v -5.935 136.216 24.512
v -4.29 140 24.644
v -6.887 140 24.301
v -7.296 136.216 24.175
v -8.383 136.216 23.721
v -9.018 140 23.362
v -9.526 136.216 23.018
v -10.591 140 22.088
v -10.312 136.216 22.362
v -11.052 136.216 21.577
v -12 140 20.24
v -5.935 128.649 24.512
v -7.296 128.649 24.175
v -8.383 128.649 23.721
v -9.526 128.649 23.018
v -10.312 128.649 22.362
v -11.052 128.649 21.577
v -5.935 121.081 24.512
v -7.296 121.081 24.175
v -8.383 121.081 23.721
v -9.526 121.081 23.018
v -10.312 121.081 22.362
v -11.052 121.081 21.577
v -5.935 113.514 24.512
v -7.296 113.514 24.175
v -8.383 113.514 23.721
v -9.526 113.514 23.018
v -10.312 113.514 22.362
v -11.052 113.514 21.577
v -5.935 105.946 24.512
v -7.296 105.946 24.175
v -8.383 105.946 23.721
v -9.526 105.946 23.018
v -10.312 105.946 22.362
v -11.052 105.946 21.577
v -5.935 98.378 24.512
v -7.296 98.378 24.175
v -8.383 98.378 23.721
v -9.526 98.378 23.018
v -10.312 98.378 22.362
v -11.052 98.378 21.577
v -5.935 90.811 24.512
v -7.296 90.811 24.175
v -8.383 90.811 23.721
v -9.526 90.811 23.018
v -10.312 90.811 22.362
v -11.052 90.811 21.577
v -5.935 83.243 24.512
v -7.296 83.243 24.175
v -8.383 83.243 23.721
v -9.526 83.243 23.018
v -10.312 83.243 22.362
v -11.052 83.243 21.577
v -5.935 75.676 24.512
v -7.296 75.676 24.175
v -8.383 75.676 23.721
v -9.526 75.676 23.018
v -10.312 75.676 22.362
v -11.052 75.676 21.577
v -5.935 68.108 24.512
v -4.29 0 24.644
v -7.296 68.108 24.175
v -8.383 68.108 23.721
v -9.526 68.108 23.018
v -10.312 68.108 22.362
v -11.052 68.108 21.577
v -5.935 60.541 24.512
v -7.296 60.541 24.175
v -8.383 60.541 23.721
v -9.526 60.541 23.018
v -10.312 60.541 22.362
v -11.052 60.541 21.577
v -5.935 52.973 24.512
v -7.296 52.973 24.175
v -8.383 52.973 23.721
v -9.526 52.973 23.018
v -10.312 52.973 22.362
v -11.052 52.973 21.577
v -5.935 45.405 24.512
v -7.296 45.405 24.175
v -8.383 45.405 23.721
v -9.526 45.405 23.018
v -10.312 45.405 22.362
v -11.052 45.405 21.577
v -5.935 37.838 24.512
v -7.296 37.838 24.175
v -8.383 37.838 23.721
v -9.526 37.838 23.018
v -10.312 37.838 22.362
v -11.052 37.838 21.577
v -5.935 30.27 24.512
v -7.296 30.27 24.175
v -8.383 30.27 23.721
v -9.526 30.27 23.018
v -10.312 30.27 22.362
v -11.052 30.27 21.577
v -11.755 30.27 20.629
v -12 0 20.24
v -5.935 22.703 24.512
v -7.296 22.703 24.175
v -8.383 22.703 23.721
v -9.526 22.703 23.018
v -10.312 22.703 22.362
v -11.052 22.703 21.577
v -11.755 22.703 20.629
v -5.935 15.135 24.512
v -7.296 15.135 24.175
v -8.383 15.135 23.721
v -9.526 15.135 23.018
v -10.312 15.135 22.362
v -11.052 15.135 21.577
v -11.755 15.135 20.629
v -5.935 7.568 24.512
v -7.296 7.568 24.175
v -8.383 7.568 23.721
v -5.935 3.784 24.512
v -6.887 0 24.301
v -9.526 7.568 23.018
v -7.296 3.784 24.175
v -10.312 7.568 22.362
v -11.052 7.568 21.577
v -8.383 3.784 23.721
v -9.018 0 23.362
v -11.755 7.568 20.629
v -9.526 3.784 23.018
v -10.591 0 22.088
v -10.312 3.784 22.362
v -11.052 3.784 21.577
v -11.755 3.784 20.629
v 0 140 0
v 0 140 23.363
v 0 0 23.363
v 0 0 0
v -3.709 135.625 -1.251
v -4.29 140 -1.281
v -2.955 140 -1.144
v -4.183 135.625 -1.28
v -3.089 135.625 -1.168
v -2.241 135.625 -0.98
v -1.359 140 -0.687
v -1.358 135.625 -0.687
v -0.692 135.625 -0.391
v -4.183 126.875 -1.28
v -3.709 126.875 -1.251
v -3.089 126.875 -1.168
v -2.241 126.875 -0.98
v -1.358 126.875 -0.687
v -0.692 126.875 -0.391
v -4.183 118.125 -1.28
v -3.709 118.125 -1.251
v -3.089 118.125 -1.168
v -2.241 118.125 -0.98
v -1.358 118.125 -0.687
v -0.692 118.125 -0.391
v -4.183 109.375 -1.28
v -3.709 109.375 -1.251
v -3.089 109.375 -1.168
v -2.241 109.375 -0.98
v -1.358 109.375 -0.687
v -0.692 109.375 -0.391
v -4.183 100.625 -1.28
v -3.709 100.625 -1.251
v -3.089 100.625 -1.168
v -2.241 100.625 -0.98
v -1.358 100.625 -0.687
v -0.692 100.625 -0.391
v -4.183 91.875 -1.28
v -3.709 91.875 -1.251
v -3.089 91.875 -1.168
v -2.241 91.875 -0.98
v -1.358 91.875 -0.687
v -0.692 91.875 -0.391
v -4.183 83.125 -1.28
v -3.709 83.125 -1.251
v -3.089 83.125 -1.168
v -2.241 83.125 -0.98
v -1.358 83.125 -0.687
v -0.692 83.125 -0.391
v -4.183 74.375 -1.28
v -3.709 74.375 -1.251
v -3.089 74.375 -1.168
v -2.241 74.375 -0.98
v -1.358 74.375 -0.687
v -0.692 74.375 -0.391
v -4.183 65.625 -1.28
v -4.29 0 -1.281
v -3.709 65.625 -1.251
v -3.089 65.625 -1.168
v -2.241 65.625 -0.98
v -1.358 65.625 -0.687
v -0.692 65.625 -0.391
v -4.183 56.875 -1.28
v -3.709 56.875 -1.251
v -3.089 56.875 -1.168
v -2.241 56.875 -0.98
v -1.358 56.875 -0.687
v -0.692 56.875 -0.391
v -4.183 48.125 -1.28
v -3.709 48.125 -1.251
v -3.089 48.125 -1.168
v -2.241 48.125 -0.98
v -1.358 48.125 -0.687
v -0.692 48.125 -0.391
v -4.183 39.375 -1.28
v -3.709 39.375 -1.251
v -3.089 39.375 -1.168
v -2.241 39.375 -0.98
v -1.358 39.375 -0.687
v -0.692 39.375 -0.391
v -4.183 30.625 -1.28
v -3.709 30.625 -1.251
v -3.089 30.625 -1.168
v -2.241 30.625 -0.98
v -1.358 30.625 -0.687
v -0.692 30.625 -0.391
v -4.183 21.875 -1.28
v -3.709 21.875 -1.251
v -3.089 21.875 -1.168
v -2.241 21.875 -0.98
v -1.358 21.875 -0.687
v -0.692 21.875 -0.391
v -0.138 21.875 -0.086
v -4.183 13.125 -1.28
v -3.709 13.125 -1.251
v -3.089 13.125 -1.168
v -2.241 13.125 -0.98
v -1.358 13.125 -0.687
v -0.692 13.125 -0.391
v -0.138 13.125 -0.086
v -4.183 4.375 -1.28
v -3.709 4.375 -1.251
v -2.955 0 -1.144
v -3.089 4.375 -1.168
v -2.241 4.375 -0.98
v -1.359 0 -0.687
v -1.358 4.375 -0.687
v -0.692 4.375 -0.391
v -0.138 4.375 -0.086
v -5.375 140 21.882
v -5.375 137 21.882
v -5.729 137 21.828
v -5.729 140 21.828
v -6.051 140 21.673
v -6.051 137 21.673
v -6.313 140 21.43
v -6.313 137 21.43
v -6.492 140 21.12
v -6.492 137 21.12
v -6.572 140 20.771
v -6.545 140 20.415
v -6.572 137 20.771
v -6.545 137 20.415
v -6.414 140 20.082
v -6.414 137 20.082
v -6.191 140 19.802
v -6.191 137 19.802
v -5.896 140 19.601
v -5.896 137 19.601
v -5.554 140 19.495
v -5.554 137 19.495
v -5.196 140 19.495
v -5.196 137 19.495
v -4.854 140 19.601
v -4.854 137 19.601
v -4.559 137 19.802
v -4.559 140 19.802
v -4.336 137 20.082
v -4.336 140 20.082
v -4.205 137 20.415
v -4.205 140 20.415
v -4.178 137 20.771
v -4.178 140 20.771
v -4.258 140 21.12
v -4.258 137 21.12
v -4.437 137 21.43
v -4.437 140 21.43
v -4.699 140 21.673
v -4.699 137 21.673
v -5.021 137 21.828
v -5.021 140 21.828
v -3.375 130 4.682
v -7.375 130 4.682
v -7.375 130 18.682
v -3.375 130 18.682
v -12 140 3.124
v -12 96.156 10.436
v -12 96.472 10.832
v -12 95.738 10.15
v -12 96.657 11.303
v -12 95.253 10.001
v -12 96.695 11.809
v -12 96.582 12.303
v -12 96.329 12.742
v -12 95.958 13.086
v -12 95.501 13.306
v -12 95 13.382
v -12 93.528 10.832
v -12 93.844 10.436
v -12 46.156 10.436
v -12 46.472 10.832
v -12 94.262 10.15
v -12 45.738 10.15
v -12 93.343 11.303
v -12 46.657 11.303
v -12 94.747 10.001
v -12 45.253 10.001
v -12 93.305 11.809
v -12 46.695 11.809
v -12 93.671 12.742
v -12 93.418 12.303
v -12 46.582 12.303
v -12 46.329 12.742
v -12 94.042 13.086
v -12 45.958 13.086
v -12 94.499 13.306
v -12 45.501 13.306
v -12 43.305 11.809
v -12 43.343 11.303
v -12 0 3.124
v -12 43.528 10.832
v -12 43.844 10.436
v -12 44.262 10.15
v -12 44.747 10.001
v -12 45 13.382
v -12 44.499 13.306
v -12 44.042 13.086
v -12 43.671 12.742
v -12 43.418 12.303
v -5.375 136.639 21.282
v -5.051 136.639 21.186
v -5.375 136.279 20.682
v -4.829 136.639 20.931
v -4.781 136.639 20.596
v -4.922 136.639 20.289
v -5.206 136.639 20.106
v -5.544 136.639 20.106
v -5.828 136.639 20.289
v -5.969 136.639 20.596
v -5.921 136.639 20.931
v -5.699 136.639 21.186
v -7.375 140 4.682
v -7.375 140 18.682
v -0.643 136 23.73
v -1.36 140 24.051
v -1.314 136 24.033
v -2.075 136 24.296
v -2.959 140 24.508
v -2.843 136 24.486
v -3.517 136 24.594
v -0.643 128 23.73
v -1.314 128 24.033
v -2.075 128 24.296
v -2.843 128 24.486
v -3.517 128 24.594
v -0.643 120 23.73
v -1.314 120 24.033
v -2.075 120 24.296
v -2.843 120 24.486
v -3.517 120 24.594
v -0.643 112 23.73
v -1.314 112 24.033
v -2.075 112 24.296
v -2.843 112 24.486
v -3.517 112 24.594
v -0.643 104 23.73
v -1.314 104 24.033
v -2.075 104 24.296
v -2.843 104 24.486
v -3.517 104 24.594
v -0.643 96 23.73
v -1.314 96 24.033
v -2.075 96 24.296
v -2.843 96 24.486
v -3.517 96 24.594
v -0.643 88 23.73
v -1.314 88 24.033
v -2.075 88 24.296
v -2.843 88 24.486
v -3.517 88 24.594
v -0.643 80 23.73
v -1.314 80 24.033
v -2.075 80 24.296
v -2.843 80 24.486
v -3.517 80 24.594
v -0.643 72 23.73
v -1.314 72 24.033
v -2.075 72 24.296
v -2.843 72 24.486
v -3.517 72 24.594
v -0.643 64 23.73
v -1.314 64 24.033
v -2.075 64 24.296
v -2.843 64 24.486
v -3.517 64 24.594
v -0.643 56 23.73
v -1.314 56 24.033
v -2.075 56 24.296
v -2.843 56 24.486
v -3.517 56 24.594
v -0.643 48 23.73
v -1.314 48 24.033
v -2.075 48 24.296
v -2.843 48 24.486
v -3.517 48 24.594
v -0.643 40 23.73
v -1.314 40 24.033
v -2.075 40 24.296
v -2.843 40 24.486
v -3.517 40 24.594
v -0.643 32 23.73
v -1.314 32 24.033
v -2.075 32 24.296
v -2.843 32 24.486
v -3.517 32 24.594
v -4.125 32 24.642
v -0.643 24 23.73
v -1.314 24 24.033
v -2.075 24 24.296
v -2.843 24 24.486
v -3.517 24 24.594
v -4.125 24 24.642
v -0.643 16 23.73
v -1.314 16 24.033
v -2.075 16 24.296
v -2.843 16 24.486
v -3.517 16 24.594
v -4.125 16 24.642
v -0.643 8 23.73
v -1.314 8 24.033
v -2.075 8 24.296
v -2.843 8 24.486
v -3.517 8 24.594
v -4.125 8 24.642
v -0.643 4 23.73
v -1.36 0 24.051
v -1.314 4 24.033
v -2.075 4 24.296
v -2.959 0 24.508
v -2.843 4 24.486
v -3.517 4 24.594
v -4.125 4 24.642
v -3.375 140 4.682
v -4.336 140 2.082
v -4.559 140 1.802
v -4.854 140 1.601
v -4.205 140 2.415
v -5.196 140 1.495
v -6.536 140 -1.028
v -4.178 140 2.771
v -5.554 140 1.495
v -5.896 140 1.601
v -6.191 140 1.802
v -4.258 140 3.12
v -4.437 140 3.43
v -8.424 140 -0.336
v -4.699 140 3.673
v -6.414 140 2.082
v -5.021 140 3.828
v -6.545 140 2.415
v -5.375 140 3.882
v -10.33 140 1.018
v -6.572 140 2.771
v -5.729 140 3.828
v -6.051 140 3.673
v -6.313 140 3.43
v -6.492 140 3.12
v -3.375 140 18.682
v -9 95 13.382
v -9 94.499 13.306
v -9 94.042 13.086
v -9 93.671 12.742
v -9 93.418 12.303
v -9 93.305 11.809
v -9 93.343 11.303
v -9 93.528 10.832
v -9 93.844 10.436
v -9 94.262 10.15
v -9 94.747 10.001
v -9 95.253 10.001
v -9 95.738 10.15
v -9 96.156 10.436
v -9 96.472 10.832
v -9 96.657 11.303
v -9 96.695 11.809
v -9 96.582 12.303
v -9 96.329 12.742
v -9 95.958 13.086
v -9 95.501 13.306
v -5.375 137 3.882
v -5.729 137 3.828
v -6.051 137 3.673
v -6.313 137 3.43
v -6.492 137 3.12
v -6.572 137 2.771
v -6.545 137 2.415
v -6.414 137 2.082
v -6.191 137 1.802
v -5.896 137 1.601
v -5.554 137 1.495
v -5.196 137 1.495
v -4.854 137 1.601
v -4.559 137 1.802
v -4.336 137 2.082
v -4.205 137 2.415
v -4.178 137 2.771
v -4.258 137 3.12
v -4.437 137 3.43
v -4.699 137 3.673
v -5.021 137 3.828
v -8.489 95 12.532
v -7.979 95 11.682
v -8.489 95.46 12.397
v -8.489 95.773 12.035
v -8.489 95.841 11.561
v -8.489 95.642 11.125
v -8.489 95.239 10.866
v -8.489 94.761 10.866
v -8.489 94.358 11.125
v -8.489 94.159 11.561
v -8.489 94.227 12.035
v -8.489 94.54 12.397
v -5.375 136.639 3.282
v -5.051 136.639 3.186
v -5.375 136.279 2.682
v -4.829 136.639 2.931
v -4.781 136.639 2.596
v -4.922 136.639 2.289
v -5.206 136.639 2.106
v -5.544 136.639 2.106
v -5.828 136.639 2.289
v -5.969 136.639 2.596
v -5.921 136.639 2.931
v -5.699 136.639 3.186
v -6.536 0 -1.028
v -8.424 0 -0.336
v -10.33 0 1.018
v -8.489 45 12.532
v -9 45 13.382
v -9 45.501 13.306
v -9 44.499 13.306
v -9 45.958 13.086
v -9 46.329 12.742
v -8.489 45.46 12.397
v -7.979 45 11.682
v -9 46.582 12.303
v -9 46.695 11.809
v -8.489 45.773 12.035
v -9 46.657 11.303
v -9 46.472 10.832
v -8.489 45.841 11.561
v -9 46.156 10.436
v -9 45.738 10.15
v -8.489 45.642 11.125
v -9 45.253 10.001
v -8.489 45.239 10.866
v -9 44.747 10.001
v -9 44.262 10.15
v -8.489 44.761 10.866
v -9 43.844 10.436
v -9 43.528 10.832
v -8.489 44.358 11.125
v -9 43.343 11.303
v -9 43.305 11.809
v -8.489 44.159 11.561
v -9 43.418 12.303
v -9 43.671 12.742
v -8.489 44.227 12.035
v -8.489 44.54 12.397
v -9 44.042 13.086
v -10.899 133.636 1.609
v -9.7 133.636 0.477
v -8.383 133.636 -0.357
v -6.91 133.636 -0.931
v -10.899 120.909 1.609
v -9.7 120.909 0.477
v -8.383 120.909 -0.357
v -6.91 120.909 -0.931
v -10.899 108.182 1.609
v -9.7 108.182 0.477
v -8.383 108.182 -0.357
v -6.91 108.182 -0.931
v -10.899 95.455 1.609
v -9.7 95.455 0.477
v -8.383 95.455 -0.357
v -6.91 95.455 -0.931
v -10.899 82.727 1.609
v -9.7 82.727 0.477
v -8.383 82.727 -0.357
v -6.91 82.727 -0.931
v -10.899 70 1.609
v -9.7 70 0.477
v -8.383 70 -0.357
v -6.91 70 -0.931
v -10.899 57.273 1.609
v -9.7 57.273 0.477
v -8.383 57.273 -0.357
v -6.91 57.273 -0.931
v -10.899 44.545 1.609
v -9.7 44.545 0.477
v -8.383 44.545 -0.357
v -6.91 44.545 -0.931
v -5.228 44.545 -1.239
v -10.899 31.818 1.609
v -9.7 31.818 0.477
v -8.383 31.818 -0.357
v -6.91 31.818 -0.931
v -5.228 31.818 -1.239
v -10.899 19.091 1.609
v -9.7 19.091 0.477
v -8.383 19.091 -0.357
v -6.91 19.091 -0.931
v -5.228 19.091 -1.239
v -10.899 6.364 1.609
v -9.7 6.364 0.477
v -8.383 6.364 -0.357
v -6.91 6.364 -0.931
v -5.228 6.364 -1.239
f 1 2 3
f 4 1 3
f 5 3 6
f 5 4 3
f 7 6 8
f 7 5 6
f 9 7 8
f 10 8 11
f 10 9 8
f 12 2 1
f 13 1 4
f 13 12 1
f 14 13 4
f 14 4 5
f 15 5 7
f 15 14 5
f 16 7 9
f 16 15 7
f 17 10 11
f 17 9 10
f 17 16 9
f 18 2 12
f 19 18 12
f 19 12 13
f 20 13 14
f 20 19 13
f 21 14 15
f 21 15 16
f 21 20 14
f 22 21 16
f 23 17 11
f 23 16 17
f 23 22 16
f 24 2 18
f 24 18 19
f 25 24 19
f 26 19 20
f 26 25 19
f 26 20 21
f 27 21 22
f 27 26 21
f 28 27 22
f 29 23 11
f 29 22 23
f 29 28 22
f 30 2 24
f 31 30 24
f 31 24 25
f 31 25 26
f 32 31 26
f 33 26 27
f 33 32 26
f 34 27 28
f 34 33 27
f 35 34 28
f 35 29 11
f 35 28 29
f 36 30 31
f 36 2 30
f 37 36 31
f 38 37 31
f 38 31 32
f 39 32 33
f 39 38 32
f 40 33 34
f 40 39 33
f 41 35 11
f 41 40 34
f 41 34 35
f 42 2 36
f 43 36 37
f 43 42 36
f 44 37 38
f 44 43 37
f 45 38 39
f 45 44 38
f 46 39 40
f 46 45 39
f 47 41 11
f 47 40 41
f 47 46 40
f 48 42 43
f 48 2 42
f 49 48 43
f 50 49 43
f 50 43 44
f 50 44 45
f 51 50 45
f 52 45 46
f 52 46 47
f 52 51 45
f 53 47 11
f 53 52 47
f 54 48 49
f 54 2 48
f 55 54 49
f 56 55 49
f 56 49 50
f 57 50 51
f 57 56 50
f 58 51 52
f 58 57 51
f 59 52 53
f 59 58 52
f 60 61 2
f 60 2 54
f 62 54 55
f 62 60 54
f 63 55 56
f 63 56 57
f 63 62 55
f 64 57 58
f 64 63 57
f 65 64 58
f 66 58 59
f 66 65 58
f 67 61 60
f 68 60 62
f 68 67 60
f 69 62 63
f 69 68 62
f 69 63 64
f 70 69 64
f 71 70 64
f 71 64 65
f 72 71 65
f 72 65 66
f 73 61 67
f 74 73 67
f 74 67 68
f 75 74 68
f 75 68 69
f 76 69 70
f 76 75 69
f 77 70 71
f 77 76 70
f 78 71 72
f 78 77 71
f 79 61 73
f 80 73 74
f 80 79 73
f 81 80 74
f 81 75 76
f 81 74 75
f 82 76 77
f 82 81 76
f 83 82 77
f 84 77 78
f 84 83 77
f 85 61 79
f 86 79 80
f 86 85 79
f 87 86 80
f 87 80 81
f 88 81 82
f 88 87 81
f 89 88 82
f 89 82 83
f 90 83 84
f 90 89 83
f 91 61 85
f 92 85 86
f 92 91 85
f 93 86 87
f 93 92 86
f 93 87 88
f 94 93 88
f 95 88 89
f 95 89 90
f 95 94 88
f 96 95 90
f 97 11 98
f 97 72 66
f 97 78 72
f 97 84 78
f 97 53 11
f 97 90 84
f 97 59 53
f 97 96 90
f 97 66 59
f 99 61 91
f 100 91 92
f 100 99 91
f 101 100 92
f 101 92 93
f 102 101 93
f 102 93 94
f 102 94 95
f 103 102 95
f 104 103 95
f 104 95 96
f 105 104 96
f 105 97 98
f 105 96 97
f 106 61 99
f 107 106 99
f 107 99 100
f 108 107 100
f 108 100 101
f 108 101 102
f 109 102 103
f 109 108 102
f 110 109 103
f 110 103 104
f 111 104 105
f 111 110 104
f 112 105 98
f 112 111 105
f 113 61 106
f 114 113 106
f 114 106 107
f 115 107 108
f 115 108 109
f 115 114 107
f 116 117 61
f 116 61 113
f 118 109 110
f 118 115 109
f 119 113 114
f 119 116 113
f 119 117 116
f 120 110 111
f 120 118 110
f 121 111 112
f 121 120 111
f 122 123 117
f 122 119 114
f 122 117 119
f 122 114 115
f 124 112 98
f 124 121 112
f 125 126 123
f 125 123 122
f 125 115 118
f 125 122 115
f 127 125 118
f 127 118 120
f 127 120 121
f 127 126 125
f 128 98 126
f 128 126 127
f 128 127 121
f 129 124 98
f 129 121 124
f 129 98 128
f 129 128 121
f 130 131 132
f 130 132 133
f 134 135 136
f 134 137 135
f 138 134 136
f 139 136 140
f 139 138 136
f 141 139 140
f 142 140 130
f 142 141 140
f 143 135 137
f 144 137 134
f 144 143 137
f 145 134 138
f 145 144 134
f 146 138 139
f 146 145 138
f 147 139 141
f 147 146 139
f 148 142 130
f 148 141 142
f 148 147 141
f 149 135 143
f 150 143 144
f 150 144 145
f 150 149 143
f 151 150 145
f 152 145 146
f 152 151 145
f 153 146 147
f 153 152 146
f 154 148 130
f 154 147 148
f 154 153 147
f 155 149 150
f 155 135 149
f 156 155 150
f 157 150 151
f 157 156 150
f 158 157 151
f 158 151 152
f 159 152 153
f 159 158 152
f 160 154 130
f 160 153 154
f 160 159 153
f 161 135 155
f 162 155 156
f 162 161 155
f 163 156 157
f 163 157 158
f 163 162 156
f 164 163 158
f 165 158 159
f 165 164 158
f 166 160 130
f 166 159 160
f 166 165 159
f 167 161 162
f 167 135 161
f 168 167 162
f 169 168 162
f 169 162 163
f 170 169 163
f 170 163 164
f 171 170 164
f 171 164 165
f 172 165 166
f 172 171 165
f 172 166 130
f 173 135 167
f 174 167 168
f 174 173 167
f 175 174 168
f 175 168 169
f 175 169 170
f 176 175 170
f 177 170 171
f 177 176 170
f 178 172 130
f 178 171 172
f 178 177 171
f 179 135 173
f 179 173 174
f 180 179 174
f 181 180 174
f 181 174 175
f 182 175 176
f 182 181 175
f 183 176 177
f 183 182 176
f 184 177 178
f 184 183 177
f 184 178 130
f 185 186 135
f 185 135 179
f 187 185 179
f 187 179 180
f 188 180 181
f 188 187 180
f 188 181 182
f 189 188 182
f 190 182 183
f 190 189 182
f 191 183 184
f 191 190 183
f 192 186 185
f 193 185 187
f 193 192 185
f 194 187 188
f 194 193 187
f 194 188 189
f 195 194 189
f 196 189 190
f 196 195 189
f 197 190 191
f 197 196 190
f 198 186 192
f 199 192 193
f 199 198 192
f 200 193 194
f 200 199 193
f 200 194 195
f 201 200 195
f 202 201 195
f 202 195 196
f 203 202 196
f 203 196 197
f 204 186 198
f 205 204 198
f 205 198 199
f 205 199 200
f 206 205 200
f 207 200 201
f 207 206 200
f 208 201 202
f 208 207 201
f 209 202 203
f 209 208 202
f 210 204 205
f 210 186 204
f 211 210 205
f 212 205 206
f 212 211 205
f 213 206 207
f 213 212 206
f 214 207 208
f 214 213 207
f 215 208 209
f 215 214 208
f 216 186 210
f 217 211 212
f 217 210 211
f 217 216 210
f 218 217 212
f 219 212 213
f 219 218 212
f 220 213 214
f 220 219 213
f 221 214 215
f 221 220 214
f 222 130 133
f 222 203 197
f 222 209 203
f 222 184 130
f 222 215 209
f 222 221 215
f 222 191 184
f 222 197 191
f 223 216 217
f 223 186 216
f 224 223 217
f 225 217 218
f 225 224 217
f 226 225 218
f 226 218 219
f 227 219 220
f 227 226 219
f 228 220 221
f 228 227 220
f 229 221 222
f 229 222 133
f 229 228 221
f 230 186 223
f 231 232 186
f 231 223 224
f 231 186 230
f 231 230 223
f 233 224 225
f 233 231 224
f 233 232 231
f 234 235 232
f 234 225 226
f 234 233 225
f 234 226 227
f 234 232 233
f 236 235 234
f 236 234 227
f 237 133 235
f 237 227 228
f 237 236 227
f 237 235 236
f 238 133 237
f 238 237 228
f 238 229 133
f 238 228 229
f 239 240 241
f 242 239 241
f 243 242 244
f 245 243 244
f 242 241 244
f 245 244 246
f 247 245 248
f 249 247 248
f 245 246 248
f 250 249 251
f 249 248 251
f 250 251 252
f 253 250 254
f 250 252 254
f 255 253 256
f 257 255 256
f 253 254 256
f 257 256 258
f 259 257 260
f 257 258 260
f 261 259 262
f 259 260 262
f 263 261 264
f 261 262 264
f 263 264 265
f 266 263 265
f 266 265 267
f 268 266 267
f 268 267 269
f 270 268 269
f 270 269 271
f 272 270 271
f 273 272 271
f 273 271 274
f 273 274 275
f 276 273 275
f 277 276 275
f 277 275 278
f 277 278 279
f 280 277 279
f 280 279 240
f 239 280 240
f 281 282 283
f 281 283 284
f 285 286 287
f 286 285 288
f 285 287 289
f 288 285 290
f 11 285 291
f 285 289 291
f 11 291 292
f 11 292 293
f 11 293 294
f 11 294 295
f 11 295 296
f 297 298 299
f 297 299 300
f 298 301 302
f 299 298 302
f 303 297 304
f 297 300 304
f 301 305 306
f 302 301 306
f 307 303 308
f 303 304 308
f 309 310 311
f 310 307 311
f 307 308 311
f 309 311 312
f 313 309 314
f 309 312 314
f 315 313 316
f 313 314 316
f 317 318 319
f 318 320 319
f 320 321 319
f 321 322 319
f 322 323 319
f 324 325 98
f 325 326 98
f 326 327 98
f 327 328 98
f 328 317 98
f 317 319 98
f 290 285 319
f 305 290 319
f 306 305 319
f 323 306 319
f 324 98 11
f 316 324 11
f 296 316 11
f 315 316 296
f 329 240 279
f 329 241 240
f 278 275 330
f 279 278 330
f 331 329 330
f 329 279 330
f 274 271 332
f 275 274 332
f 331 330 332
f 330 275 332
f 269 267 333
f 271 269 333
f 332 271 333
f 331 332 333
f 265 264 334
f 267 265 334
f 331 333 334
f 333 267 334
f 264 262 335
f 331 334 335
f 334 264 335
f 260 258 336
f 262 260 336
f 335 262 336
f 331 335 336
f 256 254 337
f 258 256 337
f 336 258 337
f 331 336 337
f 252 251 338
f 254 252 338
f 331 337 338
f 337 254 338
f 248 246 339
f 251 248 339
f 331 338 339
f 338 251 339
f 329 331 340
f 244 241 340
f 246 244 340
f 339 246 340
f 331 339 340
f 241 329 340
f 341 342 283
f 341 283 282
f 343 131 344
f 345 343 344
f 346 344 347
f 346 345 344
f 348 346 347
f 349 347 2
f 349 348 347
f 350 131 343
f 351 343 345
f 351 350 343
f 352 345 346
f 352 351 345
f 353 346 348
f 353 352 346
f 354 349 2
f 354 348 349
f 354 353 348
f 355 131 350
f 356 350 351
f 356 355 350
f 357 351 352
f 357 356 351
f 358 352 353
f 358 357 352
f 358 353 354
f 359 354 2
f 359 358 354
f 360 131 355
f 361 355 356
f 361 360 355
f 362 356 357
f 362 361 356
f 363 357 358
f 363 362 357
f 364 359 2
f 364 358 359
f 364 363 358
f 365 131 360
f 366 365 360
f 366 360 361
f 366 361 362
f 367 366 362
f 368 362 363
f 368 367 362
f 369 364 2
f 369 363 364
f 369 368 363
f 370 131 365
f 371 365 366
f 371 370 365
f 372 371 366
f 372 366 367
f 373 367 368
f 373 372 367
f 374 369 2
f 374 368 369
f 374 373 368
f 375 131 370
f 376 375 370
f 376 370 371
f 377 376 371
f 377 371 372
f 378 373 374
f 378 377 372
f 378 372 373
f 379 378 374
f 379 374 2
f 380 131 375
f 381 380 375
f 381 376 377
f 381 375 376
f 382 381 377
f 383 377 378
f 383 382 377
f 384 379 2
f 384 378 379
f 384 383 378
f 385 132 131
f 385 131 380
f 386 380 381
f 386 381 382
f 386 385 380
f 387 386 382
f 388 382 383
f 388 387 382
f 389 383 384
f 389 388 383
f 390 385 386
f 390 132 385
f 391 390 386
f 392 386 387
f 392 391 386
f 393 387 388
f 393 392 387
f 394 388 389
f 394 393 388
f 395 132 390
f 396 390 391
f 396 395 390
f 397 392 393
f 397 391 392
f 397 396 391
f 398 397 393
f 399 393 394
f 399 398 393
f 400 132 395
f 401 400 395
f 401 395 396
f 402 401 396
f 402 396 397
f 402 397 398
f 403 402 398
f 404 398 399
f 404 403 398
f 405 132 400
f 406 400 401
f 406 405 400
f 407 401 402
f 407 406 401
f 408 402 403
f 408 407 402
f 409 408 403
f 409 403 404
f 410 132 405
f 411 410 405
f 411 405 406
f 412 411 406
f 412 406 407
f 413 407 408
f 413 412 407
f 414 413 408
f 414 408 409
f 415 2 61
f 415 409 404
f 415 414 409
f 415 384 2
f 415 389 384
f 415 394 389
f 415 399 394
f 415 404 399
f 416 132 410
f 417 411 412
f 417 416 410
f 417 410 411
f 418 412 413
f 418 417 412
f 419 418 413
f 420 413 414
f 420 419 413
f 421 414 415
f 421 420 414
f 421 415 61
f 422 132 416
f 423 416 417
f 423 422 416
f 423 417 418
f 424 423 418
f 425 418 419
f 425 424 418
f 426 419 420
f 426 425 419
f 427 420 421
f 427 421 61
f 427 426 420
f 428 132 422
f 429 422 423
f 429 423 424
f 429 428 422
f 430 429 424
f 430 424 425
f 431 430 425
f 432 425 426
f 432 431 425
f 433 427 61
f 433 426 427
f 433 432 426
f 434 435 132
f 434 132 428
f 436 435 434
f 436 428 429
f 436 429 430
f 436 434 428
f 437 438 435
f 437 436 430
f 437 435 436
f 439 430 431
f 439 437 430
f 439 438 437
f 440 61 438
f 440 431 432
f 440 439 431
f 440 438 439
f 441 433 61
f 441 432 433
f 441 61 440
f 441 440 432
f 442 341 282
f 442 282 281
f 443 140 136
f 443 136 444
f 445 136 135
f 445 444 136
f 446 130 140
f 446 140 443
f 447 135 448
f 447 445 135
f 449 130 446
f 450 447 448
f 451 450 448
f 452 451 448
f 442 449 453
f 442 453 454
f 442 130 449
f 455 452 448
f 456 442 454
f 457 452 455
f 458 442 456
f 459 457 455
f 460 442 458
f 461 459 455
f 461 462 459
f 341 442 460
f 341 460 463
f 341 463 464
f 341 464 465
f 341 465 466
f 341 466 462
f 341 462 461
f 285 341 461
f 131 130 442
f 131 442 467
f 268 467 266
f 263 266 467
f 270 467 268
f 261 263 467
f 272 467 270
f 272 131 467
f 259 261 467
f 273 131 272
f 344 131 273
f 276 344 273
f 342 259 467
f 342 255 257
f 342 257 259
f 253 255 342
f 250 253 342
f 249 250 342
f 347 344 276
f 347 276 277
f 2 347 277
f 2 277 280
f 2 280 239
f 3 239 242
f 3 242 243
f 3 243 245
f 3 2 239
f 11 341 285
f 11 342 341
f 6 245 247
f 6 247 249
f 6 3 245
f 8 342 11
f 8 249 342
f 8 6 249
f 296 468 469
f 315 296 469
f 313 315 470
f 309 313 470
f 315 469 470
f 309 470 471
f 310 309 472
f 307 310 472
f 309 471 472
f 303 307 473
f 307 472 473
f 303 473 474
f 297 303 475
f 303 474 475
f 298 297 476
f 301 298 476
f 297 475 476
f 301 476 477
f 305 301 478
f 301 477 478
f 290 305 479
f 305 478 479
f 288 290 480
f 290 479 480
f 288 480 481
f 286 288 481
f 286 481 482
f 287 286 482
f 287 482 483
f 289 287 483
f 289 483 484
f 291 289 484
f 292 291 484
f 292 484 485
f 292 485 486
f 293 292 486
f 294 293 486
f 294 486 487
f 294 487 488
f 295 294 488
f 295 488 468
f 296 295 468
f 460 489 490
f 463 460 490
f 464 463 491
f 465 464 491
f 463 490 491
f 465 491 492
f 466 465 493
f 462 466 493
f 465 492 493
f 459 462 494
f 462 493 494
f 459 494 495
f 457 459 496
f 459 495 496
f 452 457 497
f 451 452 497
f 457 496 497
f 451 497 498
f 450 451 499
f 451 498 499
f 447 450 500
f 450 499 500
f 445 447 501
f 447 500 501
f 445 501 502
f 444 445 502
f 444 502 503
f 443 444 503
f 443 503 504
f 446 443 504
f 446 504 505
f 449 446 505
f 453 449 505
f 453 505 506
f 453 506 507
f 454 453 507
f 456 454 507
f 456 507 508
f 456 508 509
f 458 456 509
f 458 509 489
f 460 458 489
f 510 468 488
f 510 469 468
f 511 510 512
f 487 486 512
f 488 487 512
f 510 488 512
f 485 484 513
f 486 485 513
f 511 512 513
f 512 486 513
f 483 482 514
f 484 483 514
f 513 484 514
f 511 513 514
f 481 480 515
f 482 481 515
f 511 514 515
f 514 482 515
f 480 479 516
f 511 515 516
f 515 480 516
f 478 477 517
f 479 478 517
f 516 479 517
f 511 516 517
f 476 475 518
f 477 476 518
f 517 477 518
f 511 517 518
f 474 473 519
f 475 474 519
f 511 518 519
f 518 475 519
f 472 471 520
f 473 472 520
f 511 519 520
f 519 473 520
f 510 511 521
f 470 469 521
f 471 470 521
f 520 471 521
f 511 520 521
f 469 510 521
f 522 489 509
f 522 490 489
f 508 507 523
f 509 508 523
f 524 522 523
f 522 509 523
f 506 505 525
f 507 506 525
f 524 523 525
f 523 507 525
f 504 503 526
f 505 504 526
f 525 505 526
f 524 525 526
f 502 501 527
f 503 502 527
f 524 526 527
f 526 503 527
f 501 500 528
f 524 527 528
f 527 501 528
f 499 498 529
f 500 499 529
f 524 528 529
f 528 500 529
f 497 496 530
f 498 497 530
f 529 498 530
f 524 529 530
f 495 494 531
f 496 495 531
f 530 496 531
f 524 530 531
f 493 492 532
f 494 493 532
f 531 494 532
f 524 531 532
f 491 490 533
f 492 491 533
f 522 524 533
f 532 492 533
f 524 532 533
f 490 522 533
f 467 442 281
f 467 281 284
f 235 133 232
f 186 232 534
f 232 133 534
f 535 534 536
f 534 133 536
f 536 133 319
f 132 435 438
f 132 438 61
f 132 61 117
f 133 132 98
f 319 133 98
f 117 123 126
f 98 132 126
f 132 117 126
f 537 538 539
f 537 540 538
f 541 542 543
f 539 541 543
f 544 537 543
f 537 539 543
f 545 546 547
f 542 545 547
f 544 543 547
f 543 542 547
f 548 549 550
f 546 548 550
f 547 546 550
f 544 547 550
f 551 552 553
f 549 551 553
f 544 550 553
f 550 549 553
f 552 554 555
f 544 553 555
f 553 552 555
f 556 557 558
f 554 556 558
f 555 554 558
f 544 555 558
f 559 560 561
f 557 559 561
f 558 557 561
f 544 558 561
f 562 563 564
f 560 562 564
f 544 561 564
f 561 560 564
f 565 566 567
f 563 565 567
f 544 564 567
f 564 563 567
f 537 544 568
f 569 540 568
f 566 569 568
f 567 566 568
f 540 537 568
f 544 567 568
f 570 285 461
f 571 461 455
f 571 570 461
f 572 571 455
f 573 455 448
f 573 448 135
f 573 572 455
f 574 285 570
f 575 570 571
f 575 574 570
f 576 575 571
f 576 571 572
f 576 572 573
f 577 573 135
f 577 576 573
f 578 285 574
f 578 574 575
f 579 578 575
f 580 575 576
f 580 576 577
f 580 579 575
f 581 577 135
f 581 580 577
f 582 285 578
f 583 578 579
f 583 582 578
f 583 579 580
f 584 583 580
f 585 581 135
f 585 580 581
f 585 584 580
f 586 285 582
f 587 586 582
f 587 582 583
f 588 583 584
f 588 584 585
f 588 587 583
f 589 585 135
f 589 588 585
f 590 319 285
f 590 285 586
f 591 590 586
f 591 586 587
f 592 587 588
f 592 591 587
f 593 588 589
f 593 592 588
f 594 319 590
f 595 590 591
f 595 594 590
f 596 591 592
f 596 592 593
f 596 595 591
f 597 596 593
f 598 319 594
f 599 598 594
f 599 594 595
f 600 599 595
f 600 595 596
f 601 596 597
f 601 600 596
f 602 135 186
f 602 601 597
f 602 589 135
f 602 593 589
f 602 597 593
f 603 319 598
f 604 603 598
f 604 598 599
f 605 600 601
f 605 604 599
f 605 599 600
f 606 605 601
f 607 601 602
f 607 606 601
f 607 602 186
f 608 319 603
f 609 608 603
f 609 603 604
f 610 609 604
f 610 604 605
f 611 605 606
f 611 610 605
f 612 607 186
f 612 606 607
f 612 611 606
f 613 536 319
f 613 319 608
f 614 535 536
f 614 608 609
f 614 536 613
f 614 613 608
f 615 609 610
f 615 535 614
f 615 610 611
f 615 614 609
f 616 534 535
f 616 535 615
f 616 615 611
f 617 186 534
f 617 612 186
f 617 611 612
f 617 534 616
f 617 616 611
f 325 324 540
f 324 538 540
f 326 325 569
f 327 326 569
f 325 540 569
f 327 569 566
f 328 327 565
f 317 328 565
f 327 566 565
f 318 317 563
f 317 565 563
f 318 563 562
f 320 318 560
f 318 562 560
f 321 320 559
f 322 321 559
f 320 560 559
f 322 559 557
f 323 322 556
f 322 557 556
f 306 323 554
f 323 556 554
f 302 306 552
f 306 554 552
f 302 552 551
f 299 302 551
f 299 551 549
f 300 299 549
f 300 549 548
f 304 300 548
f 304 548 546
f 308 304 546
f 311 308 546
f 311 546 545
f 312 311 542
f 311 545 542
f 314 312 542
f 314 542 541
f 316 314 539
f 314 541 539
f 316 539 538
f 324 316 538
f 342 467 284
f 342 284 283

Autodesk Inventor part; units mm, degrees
ref_plane "YZ Plane" through (0, 0, 0) normal (1, 0, 0) x (0, 1, 0)
ref_plane "XZ Plane" through (0, 0, 0) normal (0, 1, 0) x (-1, 0, 0)
ref_plane "XY Plane" through (0, 0, 0) normal (0, 0, 1) x (1, 0, 0)
sketch "Szkic1" plane through (0, 0, 0) normal (0, 1, 0) x (-1, 0, 0)
  spline S0 degree 3 poles (4.29, 24.6442) (4.4521, 24.6442) (4.6114, 24.6406) (4.7677, 24.6336) (4.8034, 24.632) (4.8389, 24.6302) (4.8743, 24.6283) (4.9939, 24.6216) (5.1117, 24.613) (5.2279, 24.6025) (5.2909, 24.5968) (5.3533, 24.5906) (5.4152, 24.5838) (5.5016, 24.5743) (5.5869, 24.5637) (5.6714, 24.5521) (5.7603, 24.5399) (5.8483, 24.5266) (5.9352, 24.5122) (5.9902, 24.503) (6.0448, 24.4934) (6.099, 24.4834) (6.213, 24.4624) (6.3254, 24.4394) (6.4363, 24.4145) (6.4615, 24.4088) (6.4866, 24.4031) (6.5116, 24.3972) (6.6467, 24.3657) (6.7795, 24.3313) (6.9102, 24.2942) (7.0408, 24.2571) (7.1693, 24.2173) (7.2957, 24.1748) (7.3261, 24.1646) (7.3564, 24.1542) (7.3866, 24.1437) (7.4819, 24.1104) (7.576, 24.0756) (7.6691, 24.0393) (7.7261, 24.0171) (7.7827, 23.9943) (7.8389, 23.9709) (7.9035, 23.944) (7.9676, 23.9164) (8.0312, 23.888) (8.1143, 23.8509) (8.1964, 23.8125) (8.2778, 23.7729) (8.313, 23.7557) (8.348, 23.7383) (8.3829, 23.7207) (8.4915, 23.6658) (8.5987, 23.6086) (8.7045, 23.5489) (8.7113, 23.5451) (8.7181, 23.5412) (8.7249, 23.5374) (8.8374, 23.4736) (8.9484, 23.407) (9.058, 23.3376) (9.0788, 23.3245) (9.0995, 23.3112) (9.1202, 23.2979) (9.2086, 23.2408) (9.2961, 23.1819) (9.3827, 23.121) (9.4307, 23.0873) (9.4784, 23.0531) (9.5258, 23.0182) (9.5842, 22.9753) (9.6421, 22.9315) (9.6997, 22.8868) (9.7745, 22.8287) (9.8486, 22.7691) (9.9222, 22.7079) (9.9514, 22.6836) (9.9805, 22.659) (10.0095, 22.6342) (10.1116, 22.5468) (10.2126, 22.4562) (10.3125, 22.3621) (10.4124, 22.2681) (10.5112, 22.1706) (10.609, 22.0695) (10.6346, 22.043) (10.6601, 22.0163) (10.6855, 21.9894) (10.7573, 21.9132) (10.8286, 21.8351) (10.8993, 21.7548) (10.9505, 21.6966) (11.0014, 21.6374) (11.052, 21.577) (11.0961, 21.5244) (11.1399, 21.4708) (11.1836, 21.4164) (11.2594, 21.3219) (11.3345, 21.2247) (11.409, 21.1244) (11.4266, 21.1006) (11.4443, 21.0767) (11.4619, 21.0525) (11.5537, 20.9267) (11.6444, 20.7964) (11.7342, 20.661) (11.7412, 20.6503) (11.7483, 20.6396) (11.7554, 20.6289) (11.8379, 20.5035) (11.9195, 20.3738) (12, 20.2398) knots 0 0 0 0 0.045455 0.045455 0.045455 0.05583 0.05583 0.05583 0.090909 0.090909 0.090909 0.109901 0.109901 0.109901 0.136364 0.136364 0.136364 0.164215 0.164215 0.164215 0.181818 0.181818 0.181818 0.218856 0.218856 0.218856 0.227273 0.227273 0.227273 0.272727 0.272727 0.272727 0.318182 0.318182 0.318182 0.329116 0.329116 0.329116 0.363636 0.363636 0.363636 0.384782 0.384782 0.384782 0.409091 0.409091 0.409091 0.440823 0.440823 0.440823 0.454545 0.454545 0.454545 0.497251 0.497251 0.497251 0.5 0.5 0.5 0.545455 0.545455 0.545455 0.554072 0.554072 0.554072 0.590909 0.590909 0.590909 0.611291 0.611291 0.611291 0.636364 0.636364 0.636364 0.668896 0.668896 0.668896 0.681818 0.681818 0.681818 0.727273 0.727273 0.727273 0.772727 0.772727 0.772727 0.784612 0.784612 0.784612 0.818182 0.818182 0.818182 0.842477 0.842477 0.842477 0.863636 0.863636 0.863636 0.900365 0.900365 0.900365 0.909091 0.909091 0.909091 0.954545 0.954545 0.954545 0.958127 0.958127 0.958127 1 1 1 1
  spline S1 degree 3 poles (0, 23.3634) (0.0313, 23.3834) (0.0629, 23.4032) (0.0948, 23.4229) (0.1661, 23.4669) (0.2387, 23.51) (0.3127, 23.5522) (0.3366, 23.5659) (0.3606, 23.5794) (0.3848, 23.5929) (0.4689, 23.6397) (0.5548, 23.6854) (0.6428, 23.7301) (0.6619, 23.7398) (0.6811, 23.7494) (0.7004, 23.759) (0.7955, 23.8063) (0.893, 23.8524) (0.9925, 23.8971) (1.0001, 23.9005) (1.0078, 23.9039) (1.0155, 23.9073) (1.1133, 23.9508) (1.213, 23.9929) (1.3144, 24.0334) (1.3295, 24.0394) (1.3447, 24.0454) (1.3599, 24.0514) (1.4359, 24.0812) (1.5128, 24.1101) (1.5905, 24.138) (1.6407, 24.156) (1.6913, 24.1737) (1.7423, 24.1909) (1.7757, 24.2022) (1.8093, 24.2133) (1.843, 24.2243) (1.9195, 24.2491) (1.9968, 24.2731) (2.0748, 24.2961) (2.096, 24.3023) (2.1174, 24.3085) (2.1387, 24.3146) (2.1887, 24.3289) (2.2389, 24.3428) (2.2893, 24.3563) (2.3554, 24.374) (2.4218, 24.391) (2.4885, 24.4072) (2.5077, 24.4119) (2.527, 24.4165) (2.5463, 24.4211) (2.5883, 24.431) (2.6305, 24.4407) (2.6727, 24.45) (2.7293, 24.4625) (2.786, 24.4745) (2.8426, 24.4858) (2.8813, 24.4936) (2.9201, 24.5011) (2.9588, 24.5084) (2.9723, 24.5109) (2.9859, 24.5134) (2.9995, 24.5159) (3.0482, 24.5248) (3.0967, 24.5332) (3.1446, 24.5411) (3.1899, 24.5486) (3.2347, 24.5556) (3.2786, 24.5621) (3.3055, 24.5661) (3.332, 24.57) (3.3581, 24.5736) (3.373, 24.5757) (3.3878, 24.5777) (3.4024, 24.5797) (3.4415, 24.5849) (3.4798, 24.5898) (3.5172, 24.5942) (3.5534, 24.5986) (3.5889, 24.6026) (3.6237, 24.6062) (3.6534, 24.6094) (3.6826, 24.6123) (3.7112, 24.615) (3.7155, 24.6154) (3.7198, 24.6158) (3.724, 24.6162) (3.7577, 24.6193) (3.7907, 24.6221) (3.823, 24.6246) (3.8575, 24.6273) (3.8912, 24.6297) (3.9242, 24.6318) (3.9568, 24.6339) (3.9888, 24.6357) (4.0201, 24.6372) (4.0561, 24.639) (4.0912, 24.6404) (4.1254, 24.6415) (4.1561, 24.6425) (4.186, 24.6432) (4.2153, 24.6436) (4.2407, 24.644) (4.2656, 24.6442) (4.29, 24.6442) knots 0 0 0 0 0.025747 0.025747 0.025747 0.083333 0.083333 0.083333 0.101932 0.101932 0.101932 0.166667 0.166667 0.166667 0.180728 0.180728 0.180728 0.25 0.25 0.25 0.255325 0.255325 0.255325 0.323187 0.323187 0.323187 0.333333 0.333333 0.333333 0.383956 0.383956 0.383956 0.416667 0.416667 0.416667 0.438102 0.438102 0.438102 0.486742 0.486742 0.486742 0.5 0.5 0.5 0.531015 0.531015 0.531015 0.571623 0.571623 0.571623 0.583333 0.583333 0.583333 0.608888 0.608888 0.608888 0.643164 0.643164 0.643164 0.666667 0.666667 0.666667 0.674925 0.674925 0.674925 0.704638 0.704638 0.704638 0.732781 0.732781 0.732781 0.75 0.75 0.75 0.759817 0.759817 0.759817 0.786075 0.786075 0.786075 0.811555 0.811555 0.811555 0.833333 0.833333 0.833333 0.836565 0.836565 0.836565 0.86226 0.86226 0.86226 0.889614 0.889614 0.889614 0.916667 0.916667 0.916667 0.947785 0.947785 0.947785 0.975695 0.975695 0.975695 1 1 1 1
  line L0 (0, 23.3634) -> (0, 0)
  spline S2 degree 3 poles (4.29, -1.2808) (4.2555, -1.2808) (4.2199, -1.2804) (4.1832, -1.2796) (4.15, -1.2789) (4.1159, -1.2779) (4.081, -1.2765) (4.0607, -1.2757) (4.0401, -1.2748) (4.0192, -1.2737) (4.0064, -1.2731) (3.9935, -1.2724) (3.9804, -1.2717) (3.948, -1.2699) (3.9149, -1.2678) (3.881, -1.2655) (3.8471, -1.2631) (3.8125, -1.2604) (3.7771, -1.2574) (3.7548, -1.2555) (3.7322, -1.2535) (3.7093, -1.2513) (3.6944, -1.2499) (3.6793, -1.2485) (3.664, -1.2469) (3.6238, -1.2429) (3.5825, -1.2385) (3.5402, -1.2335) (3.496, -1.2284) (3.4506, -1.2227) (3.4039, -1.2164) (3.3878, -1.2143) (3.3716, -1.2121) (3.3552, -1.2098) (3.322, -1.2051) (3.2881, -1.2002) (3.2538, -1.1949) (3.1998, -1.1867) (3.1445, -1.1778) (3.0886, -1.1682) (3.0444, -1.1606) (2.9999, -1.1526) (2.9552, -1.1443) (2.9389, -1.1412) (2.9225, -1.1381) (2.9062, -1.1349) (2.8392, -1.122) (2.7721, -1.1082) (2.7051, -1.0937) (2.6511, -1.0819) (2.5971, -1.0696) (2.5432, -1.0569) (2.5237, -1.0523) (2.5042, -1.0476) (2.4847, -1.0428) (2.4029, -1.0229) (2.3215, -1.0019) (2.2408, -0.9798) (2.2058, -0.9702) (2.1709, -0.9604) (2.1362, -0.9505) (2.0792, -0.9341) (2.0226, -0.9173) (1.9664, -0.8999) (1.8903, -0.8764) (1.8149, -0.8521) (1.7404, -0.8268) (1.7134, -0.8177) (1.6866, -0.8084) (1.6598, -0.7991) (1.5579, -0.7635) (1.4574, -0.7262) (1.3585, -0.6874) (1.3491, -0.6837) (1.3397, -0.68) (1.3303, -0.6762) (1.2151, -0.6306) (1.102, -0.5828) (0.9914, -0.5331) (0.8892, -0.4873) (0.7891, -0.4398) (0.6916, -0.3912) (0.675, -0.3829) (0.6585, -0.3746) (0.642, -0.3662) (0.5634, -0.3263) (0.4865, -0.2856) (0.4111, -0.244) (0.3779, -0.2257) (0.3451, -0.2073) (0.3125, -0.1887) (0.2537, -0.1551) (0.1957, -0.1209) (0.1385, -0.0862) (0.0918, -0.0578) (0.0456, -0.0291) (0, 0) knots 0 0 0 0 0.034308 0.034308 0.034308 0.065329 0.065329 0.065329 0.083333 0.083333 0.083333 0.094376 0.094376 0.094376 0.121838 0.121838 0.121838 0.149346 0.149346 0.149346 0.166667 0.166667 0.166667 0.177988 0.177988 0.177988 0.207919 0.207919 0.207919 0.239209 0.239209 0.239209 0.25 0.25 0.25 0.271822 0.271822 0.271822 0.306177 0.306177 0.306177 0.333333 0.333333 0.333333 0.343269 0.343269 0.343269 0.383905 0.383905 0.383905 0.416667 0.416667 0.416667 0.428546 0.428546 0.428546 0.478409 0.478409 0.478409 0.5 0.5 0.5 0.535413 0.535413 0.535413 0.583333 0.583333 0.583333 0.60065 0.60065 0.60065 0.666667 0.666667 0.666667 0.672941 0.672941 0.672941 0.75 0.75 0.75 0.821219 0.821219 0.821219 0.833333 0.833333 0.833333 0.891251 0.891251 0.891251 0.916667 0.916667 0.916667 0.962519 0.962519 0.962519 1 1 1 1
  spline S3 degree 3 poles (12, 3.1236) (11.9126, 2.9781) (11.7351, 2.6973) (11.4629, 2.3063) (11.1845, 1.9427) (10.9003, 1.6047) (10.61, 1.2902) (10.3135, 0.9978) (10.0106, 0.726) (9.7008, 0.4735) (9.3839, 0.2395) (9.0593, 0.0229) (8.7263, -0.1767) (8.3844, -0.36) (8.0328, -0.5272) (7.6709, -0.6786) (7.2976, -0.814) (6.9122, -0.9335) (6.5138, -1.0366) (6.1013, -1.1229) (5.674, -1.1918) (5.2306, -1.2423) (4.7705, -1.2736) (4.4521, -1.2808) (4.29, -1.2808) knots 0 0 0 0 0.045455 0.090909 0.136364 0.181818 0.227273 0.272727 0.318182 0.363636 0.409091 0.454545 0.5 0.545455 0.590909 0.636364 0.681818 0.727273 0.772727 0.818182 0.863636 0.909091 0.954545 1 1 1 1
  line L1 (12, 3.1236) -> (12, 20.2398)
  line L2 (15, 21.0088) -> (15, 2.3547)
  line L3 (-3, 24.8488) -> (-3, 21.962) construction
  line L4 (12.5, 20.3765) -> (12.5, 2.9869)
  line L5 (-0.5, 23.6324) -> (-0.5, -0.269)
  arc A0 (4.29, -1.7808) -> (12.5, 2.9869) centre (4.2141, 7.8027) ccw
  arc A1 (-0.5, -0.269) -> (4.29, -1.7808) centre (4.3945, 6.8946) ccw
  line L6 (0, 0) -> (-0.2687, -0.4216) construction
  line L7 (12, 3.1236) -> (12.4286, 2.8661) construction
  arc A2 (12.5, 20.3765) -> (4.29, 25.1442) centre (4.2141, 15.5608) ccw
  arc A3 (4.29, 25.1442) -> (-0.5, 23.6324) centre (4.3943, 16.4696) ccw
  line L8 (12, 20.2398) -> (12.4286, 20.4974) construction
  line L9 (0, 23.3634) -> (-0.2688, 23.7851) construction
  arc A4 (4.29, -4.2808) -> (15, 2.3547) centre (4.2142, 7.8026) ccw
  arc A5 (-3, -1.4854) -> (4.29, -4.2808) centre (4.394, 6.894) ccw
  arc A6 (15, 21.0088) -> (4.29, 27.6442) centre (4.2142, 15.5608) ccw
  arc A7 (4.29, 27.6442) -> (-3, 24.8488) centre (4.3938, 16.4703) ccw
  line L10 (12.4286, 2.8661) -> (14.5714, 1.5783) construction
  line L11 (12.5, 20.3765) -> (14.6615, 21.6328) construction
  line L12 (-0.5, 23.6324) -> (-1.9104, 25.6966) construction
  line L13 (-0.5, -0.269) -> (-1.9103, -2.3332) construction
  line L14 (-0.5, 3.731) -> (-3, 3.731)
  line L15 (-0.5, 19.6324) -> (-3, 19.6324)
  line L16 (-3, 24.8488) -> (-8, 27.7355)
  line L17 (-8, 27.7355) -> (-8, 24.8488)
  line L18 (-8, 24.8488) -> (-3, 21.962)
  line L19 (-3, 21.962) -> (-3, 24.8488)
  line L20 (-3, 21.962) -> (-3, -1.4854)
  line L21 (-3, -1.4854) -> (-8, -4.3722)
  line L22 (-8, -4.3722) -> (-8, -1.4854)
  line L23 (-8, -1.4854) -> (-3, 1.4013)
  line L24 (-3, 1.4013) -> (-3, -1.4854)
  line L25 (-5.5, 26.2922) -> (-6.75, 24.1271) construction
  line L26 (-5.1651, -2.7354) -> (-6.4151, -0.5703) construction
  line L27 (-8, 24.8488) -> (-8, -1.4854)
  line L28 (15.5, 36.6817) -> (12.5, 36.6817)
  line L29 (12.5, 36.6817) -> (12.5, 24.3562)
  line L30 (12.5, -13.3183) -> (15.5, -13.3183)
  line L31 (15.5, -13.3183) -> (15.5, 36.6817)
  line L32 (12.5, 24.3562) -> (12.5, 20.3765)
  line L33 (12.5, 20.3765) -> (12.5, 2.8231)
  line L34 (12.5, -0.9928) -> (12.5, -13.3183)
  line L35 (12.5, 2.8231) -> (12.5, -0.9928)
  point P0 (0, 0)
  point P1 (0, 0)
  point P2 (0, 11.6817)
  dimension "d0" = 0.5
  dimension "d1" = 0.5
  dimension "d2" = 0.5
  dimension "d3" = 0.5
  dimension "d4" = 0.5
  dimension "d5" = 0.5
  dimension "d6" = 0.5
  dimension "d7" = 0.5
  dimension "d8" = 2.5
  dimension "d9" = 2.5
  dimension "d10" = 2.5
  dimension "d11" = 2.5
  dimension "d12" = 2.5
  dimension "d13" = 2.5
  dimension "d14" = 2.5
  dimension "d15" = 2.5
  dimension "d16" = 4
  dimension "d17" = 4
  dimension "d18" = 120
  dimension "d19" = 5
  dimension "d20" = 120
  dimension "d21" = 2.5
  dimension "d22" = 2.5
  dimension "d23" = 5
  dimension "d24" = 50
  dimension "d25" = 25
  dimension "d26" = 3
extrude "Wyciągnięcie proste1" add sketch "Szkic1" along normal blind 140 contours S0 L1 S3 S2 L0 S1
sketch "Szkic2" plane through (-12, 0, 3.1236) normal (-1, 0, 0) x (0, 0, 1)
  line L0 (0, 140) -> (17.1162, 140) projected
  line L1 (17.1162, 0) -> (17.1162, 140) projected
  line L2 (0, 0) -> (0, 140) projected
  point P0 (-3.1236, 0)
  point P1 (8.5581, 45)
  point P2 (8.5581, 70)
  point P3 (8.5581, 95)
  dimension "d32" = 50
  dimension "d33" = 25
  dimension "d34" = 70
  dimension "d62" = 17.1162
  dimension "d63" = 8.5581
hole "Otwór1" at (-12, 45, 11.6817) at (-12, 95, 11.6817) direction (1, 0, 0) diameter 3.4 depth 3 tip angle 118 clearance for "Śruba ze łbem płaskim obrobiona" size "M3" standard "ANSI Profil metryczny M"
sketch "Szkic3" plane through (0, 140, 0) normal (0, 1, 0) x (1, 0, 0)
  line L0 (0, -23.3634) -> (0, 0) projected
  line L1 (0, -23.3634) -> (0, 0) projected
  line L2 (-12, -3.1236) -> (-12, -20.2398) projected
  point P0 (-5.375, -2.6817)
  point P1 (-5.375, -20.6817)
  point P2 (-5.375, -11.6817)
  dimension "d42" = 18
  dimension "d43" = 5.375
  dimension "d44" = 25.925
  dimension "d45" = 9
  dimension "d46" = 12.9625
hole "Otwór2" at (-5.375, 140, 2.6817) at (-5.375, 140, 20.6817) direction (0, -1, 0) diameter 2.4 depth 3 tip angle 118 clearance for "Śruba ze łbem płaskim obrobiona" size "M2" standard "ANSI Profil metryczny M"
sketch "Szkic4" plane through (0, 140, 0) normal (0, 1, 0) x (1, 0, 0)
  line L0 (-7.375, -4.6817) -> (-3.375, -4.6817)
  line L1 (-3.375, -4.6817) -> (-3.375, -18.6817)
  line L2 (-3.375, -18.6817) -> (-7.375, -18.6817)
  line L3 (-7.375, -18.6817) -> (-7.375, -4.6817)
  circle A0 centre (-5.375, -2.6817) radius 1.2 projected
  circle A1 centre (-5.375, -20.6817) radius 1.2 projected
  line L4 (0, -23.3634) -> (0, 0) projected
  line L5 (-12, -3.1236) -> (-12, -20.2398) projected
  point P0 (0, 0)
  dimension "d54" = 14
  dimension "d55" = 4
  dimension "d56" = 18
  dimension "d57" = 2
  dimension "d59" = 2
extrude "Wyciągnięcie proste2" cut sketch "Szkic4" against normal blind 10 contours L0 L1 L2 L3
equation "\"d0\" = d27"
equation "\"d1\" = d0"
equation "\"d2\" = d1"
equation "\"d3\" = d0"
equation "\"d4\" = d1"
equation "\"d5\" = d2"
equation "\"d6\" = d5"
equation "\"d7\" = d5"
equation "\"d8\" = d28"
equation "\"d9\" = d8"
equation "\"d10\" = d8"
equation "\"d11\" = d9"
equation "\"d12\" = d8"
equation "\"d13\" = d9"
equation "\"d14\" = d11"
equation "\"d15\" = d10"
equation "\"d16\" = d29"
equation "\"d17\" = d16"
equation "\"d20\" = d18"
equation "\"d23\" = d19"
equation "\"d25\" = 0.5 * d24"
equation "\"d63\" = 0.5 * d62"
equation "\"d45\" = 0.5 * d42"
equation "\"d46\" = 0.5 * d44"
equation "\"d27\" = 0.5"
equation "\"d28\" = 2.5"
equation "\"d29\" = 4"
properties part number "Realsens_basic"
